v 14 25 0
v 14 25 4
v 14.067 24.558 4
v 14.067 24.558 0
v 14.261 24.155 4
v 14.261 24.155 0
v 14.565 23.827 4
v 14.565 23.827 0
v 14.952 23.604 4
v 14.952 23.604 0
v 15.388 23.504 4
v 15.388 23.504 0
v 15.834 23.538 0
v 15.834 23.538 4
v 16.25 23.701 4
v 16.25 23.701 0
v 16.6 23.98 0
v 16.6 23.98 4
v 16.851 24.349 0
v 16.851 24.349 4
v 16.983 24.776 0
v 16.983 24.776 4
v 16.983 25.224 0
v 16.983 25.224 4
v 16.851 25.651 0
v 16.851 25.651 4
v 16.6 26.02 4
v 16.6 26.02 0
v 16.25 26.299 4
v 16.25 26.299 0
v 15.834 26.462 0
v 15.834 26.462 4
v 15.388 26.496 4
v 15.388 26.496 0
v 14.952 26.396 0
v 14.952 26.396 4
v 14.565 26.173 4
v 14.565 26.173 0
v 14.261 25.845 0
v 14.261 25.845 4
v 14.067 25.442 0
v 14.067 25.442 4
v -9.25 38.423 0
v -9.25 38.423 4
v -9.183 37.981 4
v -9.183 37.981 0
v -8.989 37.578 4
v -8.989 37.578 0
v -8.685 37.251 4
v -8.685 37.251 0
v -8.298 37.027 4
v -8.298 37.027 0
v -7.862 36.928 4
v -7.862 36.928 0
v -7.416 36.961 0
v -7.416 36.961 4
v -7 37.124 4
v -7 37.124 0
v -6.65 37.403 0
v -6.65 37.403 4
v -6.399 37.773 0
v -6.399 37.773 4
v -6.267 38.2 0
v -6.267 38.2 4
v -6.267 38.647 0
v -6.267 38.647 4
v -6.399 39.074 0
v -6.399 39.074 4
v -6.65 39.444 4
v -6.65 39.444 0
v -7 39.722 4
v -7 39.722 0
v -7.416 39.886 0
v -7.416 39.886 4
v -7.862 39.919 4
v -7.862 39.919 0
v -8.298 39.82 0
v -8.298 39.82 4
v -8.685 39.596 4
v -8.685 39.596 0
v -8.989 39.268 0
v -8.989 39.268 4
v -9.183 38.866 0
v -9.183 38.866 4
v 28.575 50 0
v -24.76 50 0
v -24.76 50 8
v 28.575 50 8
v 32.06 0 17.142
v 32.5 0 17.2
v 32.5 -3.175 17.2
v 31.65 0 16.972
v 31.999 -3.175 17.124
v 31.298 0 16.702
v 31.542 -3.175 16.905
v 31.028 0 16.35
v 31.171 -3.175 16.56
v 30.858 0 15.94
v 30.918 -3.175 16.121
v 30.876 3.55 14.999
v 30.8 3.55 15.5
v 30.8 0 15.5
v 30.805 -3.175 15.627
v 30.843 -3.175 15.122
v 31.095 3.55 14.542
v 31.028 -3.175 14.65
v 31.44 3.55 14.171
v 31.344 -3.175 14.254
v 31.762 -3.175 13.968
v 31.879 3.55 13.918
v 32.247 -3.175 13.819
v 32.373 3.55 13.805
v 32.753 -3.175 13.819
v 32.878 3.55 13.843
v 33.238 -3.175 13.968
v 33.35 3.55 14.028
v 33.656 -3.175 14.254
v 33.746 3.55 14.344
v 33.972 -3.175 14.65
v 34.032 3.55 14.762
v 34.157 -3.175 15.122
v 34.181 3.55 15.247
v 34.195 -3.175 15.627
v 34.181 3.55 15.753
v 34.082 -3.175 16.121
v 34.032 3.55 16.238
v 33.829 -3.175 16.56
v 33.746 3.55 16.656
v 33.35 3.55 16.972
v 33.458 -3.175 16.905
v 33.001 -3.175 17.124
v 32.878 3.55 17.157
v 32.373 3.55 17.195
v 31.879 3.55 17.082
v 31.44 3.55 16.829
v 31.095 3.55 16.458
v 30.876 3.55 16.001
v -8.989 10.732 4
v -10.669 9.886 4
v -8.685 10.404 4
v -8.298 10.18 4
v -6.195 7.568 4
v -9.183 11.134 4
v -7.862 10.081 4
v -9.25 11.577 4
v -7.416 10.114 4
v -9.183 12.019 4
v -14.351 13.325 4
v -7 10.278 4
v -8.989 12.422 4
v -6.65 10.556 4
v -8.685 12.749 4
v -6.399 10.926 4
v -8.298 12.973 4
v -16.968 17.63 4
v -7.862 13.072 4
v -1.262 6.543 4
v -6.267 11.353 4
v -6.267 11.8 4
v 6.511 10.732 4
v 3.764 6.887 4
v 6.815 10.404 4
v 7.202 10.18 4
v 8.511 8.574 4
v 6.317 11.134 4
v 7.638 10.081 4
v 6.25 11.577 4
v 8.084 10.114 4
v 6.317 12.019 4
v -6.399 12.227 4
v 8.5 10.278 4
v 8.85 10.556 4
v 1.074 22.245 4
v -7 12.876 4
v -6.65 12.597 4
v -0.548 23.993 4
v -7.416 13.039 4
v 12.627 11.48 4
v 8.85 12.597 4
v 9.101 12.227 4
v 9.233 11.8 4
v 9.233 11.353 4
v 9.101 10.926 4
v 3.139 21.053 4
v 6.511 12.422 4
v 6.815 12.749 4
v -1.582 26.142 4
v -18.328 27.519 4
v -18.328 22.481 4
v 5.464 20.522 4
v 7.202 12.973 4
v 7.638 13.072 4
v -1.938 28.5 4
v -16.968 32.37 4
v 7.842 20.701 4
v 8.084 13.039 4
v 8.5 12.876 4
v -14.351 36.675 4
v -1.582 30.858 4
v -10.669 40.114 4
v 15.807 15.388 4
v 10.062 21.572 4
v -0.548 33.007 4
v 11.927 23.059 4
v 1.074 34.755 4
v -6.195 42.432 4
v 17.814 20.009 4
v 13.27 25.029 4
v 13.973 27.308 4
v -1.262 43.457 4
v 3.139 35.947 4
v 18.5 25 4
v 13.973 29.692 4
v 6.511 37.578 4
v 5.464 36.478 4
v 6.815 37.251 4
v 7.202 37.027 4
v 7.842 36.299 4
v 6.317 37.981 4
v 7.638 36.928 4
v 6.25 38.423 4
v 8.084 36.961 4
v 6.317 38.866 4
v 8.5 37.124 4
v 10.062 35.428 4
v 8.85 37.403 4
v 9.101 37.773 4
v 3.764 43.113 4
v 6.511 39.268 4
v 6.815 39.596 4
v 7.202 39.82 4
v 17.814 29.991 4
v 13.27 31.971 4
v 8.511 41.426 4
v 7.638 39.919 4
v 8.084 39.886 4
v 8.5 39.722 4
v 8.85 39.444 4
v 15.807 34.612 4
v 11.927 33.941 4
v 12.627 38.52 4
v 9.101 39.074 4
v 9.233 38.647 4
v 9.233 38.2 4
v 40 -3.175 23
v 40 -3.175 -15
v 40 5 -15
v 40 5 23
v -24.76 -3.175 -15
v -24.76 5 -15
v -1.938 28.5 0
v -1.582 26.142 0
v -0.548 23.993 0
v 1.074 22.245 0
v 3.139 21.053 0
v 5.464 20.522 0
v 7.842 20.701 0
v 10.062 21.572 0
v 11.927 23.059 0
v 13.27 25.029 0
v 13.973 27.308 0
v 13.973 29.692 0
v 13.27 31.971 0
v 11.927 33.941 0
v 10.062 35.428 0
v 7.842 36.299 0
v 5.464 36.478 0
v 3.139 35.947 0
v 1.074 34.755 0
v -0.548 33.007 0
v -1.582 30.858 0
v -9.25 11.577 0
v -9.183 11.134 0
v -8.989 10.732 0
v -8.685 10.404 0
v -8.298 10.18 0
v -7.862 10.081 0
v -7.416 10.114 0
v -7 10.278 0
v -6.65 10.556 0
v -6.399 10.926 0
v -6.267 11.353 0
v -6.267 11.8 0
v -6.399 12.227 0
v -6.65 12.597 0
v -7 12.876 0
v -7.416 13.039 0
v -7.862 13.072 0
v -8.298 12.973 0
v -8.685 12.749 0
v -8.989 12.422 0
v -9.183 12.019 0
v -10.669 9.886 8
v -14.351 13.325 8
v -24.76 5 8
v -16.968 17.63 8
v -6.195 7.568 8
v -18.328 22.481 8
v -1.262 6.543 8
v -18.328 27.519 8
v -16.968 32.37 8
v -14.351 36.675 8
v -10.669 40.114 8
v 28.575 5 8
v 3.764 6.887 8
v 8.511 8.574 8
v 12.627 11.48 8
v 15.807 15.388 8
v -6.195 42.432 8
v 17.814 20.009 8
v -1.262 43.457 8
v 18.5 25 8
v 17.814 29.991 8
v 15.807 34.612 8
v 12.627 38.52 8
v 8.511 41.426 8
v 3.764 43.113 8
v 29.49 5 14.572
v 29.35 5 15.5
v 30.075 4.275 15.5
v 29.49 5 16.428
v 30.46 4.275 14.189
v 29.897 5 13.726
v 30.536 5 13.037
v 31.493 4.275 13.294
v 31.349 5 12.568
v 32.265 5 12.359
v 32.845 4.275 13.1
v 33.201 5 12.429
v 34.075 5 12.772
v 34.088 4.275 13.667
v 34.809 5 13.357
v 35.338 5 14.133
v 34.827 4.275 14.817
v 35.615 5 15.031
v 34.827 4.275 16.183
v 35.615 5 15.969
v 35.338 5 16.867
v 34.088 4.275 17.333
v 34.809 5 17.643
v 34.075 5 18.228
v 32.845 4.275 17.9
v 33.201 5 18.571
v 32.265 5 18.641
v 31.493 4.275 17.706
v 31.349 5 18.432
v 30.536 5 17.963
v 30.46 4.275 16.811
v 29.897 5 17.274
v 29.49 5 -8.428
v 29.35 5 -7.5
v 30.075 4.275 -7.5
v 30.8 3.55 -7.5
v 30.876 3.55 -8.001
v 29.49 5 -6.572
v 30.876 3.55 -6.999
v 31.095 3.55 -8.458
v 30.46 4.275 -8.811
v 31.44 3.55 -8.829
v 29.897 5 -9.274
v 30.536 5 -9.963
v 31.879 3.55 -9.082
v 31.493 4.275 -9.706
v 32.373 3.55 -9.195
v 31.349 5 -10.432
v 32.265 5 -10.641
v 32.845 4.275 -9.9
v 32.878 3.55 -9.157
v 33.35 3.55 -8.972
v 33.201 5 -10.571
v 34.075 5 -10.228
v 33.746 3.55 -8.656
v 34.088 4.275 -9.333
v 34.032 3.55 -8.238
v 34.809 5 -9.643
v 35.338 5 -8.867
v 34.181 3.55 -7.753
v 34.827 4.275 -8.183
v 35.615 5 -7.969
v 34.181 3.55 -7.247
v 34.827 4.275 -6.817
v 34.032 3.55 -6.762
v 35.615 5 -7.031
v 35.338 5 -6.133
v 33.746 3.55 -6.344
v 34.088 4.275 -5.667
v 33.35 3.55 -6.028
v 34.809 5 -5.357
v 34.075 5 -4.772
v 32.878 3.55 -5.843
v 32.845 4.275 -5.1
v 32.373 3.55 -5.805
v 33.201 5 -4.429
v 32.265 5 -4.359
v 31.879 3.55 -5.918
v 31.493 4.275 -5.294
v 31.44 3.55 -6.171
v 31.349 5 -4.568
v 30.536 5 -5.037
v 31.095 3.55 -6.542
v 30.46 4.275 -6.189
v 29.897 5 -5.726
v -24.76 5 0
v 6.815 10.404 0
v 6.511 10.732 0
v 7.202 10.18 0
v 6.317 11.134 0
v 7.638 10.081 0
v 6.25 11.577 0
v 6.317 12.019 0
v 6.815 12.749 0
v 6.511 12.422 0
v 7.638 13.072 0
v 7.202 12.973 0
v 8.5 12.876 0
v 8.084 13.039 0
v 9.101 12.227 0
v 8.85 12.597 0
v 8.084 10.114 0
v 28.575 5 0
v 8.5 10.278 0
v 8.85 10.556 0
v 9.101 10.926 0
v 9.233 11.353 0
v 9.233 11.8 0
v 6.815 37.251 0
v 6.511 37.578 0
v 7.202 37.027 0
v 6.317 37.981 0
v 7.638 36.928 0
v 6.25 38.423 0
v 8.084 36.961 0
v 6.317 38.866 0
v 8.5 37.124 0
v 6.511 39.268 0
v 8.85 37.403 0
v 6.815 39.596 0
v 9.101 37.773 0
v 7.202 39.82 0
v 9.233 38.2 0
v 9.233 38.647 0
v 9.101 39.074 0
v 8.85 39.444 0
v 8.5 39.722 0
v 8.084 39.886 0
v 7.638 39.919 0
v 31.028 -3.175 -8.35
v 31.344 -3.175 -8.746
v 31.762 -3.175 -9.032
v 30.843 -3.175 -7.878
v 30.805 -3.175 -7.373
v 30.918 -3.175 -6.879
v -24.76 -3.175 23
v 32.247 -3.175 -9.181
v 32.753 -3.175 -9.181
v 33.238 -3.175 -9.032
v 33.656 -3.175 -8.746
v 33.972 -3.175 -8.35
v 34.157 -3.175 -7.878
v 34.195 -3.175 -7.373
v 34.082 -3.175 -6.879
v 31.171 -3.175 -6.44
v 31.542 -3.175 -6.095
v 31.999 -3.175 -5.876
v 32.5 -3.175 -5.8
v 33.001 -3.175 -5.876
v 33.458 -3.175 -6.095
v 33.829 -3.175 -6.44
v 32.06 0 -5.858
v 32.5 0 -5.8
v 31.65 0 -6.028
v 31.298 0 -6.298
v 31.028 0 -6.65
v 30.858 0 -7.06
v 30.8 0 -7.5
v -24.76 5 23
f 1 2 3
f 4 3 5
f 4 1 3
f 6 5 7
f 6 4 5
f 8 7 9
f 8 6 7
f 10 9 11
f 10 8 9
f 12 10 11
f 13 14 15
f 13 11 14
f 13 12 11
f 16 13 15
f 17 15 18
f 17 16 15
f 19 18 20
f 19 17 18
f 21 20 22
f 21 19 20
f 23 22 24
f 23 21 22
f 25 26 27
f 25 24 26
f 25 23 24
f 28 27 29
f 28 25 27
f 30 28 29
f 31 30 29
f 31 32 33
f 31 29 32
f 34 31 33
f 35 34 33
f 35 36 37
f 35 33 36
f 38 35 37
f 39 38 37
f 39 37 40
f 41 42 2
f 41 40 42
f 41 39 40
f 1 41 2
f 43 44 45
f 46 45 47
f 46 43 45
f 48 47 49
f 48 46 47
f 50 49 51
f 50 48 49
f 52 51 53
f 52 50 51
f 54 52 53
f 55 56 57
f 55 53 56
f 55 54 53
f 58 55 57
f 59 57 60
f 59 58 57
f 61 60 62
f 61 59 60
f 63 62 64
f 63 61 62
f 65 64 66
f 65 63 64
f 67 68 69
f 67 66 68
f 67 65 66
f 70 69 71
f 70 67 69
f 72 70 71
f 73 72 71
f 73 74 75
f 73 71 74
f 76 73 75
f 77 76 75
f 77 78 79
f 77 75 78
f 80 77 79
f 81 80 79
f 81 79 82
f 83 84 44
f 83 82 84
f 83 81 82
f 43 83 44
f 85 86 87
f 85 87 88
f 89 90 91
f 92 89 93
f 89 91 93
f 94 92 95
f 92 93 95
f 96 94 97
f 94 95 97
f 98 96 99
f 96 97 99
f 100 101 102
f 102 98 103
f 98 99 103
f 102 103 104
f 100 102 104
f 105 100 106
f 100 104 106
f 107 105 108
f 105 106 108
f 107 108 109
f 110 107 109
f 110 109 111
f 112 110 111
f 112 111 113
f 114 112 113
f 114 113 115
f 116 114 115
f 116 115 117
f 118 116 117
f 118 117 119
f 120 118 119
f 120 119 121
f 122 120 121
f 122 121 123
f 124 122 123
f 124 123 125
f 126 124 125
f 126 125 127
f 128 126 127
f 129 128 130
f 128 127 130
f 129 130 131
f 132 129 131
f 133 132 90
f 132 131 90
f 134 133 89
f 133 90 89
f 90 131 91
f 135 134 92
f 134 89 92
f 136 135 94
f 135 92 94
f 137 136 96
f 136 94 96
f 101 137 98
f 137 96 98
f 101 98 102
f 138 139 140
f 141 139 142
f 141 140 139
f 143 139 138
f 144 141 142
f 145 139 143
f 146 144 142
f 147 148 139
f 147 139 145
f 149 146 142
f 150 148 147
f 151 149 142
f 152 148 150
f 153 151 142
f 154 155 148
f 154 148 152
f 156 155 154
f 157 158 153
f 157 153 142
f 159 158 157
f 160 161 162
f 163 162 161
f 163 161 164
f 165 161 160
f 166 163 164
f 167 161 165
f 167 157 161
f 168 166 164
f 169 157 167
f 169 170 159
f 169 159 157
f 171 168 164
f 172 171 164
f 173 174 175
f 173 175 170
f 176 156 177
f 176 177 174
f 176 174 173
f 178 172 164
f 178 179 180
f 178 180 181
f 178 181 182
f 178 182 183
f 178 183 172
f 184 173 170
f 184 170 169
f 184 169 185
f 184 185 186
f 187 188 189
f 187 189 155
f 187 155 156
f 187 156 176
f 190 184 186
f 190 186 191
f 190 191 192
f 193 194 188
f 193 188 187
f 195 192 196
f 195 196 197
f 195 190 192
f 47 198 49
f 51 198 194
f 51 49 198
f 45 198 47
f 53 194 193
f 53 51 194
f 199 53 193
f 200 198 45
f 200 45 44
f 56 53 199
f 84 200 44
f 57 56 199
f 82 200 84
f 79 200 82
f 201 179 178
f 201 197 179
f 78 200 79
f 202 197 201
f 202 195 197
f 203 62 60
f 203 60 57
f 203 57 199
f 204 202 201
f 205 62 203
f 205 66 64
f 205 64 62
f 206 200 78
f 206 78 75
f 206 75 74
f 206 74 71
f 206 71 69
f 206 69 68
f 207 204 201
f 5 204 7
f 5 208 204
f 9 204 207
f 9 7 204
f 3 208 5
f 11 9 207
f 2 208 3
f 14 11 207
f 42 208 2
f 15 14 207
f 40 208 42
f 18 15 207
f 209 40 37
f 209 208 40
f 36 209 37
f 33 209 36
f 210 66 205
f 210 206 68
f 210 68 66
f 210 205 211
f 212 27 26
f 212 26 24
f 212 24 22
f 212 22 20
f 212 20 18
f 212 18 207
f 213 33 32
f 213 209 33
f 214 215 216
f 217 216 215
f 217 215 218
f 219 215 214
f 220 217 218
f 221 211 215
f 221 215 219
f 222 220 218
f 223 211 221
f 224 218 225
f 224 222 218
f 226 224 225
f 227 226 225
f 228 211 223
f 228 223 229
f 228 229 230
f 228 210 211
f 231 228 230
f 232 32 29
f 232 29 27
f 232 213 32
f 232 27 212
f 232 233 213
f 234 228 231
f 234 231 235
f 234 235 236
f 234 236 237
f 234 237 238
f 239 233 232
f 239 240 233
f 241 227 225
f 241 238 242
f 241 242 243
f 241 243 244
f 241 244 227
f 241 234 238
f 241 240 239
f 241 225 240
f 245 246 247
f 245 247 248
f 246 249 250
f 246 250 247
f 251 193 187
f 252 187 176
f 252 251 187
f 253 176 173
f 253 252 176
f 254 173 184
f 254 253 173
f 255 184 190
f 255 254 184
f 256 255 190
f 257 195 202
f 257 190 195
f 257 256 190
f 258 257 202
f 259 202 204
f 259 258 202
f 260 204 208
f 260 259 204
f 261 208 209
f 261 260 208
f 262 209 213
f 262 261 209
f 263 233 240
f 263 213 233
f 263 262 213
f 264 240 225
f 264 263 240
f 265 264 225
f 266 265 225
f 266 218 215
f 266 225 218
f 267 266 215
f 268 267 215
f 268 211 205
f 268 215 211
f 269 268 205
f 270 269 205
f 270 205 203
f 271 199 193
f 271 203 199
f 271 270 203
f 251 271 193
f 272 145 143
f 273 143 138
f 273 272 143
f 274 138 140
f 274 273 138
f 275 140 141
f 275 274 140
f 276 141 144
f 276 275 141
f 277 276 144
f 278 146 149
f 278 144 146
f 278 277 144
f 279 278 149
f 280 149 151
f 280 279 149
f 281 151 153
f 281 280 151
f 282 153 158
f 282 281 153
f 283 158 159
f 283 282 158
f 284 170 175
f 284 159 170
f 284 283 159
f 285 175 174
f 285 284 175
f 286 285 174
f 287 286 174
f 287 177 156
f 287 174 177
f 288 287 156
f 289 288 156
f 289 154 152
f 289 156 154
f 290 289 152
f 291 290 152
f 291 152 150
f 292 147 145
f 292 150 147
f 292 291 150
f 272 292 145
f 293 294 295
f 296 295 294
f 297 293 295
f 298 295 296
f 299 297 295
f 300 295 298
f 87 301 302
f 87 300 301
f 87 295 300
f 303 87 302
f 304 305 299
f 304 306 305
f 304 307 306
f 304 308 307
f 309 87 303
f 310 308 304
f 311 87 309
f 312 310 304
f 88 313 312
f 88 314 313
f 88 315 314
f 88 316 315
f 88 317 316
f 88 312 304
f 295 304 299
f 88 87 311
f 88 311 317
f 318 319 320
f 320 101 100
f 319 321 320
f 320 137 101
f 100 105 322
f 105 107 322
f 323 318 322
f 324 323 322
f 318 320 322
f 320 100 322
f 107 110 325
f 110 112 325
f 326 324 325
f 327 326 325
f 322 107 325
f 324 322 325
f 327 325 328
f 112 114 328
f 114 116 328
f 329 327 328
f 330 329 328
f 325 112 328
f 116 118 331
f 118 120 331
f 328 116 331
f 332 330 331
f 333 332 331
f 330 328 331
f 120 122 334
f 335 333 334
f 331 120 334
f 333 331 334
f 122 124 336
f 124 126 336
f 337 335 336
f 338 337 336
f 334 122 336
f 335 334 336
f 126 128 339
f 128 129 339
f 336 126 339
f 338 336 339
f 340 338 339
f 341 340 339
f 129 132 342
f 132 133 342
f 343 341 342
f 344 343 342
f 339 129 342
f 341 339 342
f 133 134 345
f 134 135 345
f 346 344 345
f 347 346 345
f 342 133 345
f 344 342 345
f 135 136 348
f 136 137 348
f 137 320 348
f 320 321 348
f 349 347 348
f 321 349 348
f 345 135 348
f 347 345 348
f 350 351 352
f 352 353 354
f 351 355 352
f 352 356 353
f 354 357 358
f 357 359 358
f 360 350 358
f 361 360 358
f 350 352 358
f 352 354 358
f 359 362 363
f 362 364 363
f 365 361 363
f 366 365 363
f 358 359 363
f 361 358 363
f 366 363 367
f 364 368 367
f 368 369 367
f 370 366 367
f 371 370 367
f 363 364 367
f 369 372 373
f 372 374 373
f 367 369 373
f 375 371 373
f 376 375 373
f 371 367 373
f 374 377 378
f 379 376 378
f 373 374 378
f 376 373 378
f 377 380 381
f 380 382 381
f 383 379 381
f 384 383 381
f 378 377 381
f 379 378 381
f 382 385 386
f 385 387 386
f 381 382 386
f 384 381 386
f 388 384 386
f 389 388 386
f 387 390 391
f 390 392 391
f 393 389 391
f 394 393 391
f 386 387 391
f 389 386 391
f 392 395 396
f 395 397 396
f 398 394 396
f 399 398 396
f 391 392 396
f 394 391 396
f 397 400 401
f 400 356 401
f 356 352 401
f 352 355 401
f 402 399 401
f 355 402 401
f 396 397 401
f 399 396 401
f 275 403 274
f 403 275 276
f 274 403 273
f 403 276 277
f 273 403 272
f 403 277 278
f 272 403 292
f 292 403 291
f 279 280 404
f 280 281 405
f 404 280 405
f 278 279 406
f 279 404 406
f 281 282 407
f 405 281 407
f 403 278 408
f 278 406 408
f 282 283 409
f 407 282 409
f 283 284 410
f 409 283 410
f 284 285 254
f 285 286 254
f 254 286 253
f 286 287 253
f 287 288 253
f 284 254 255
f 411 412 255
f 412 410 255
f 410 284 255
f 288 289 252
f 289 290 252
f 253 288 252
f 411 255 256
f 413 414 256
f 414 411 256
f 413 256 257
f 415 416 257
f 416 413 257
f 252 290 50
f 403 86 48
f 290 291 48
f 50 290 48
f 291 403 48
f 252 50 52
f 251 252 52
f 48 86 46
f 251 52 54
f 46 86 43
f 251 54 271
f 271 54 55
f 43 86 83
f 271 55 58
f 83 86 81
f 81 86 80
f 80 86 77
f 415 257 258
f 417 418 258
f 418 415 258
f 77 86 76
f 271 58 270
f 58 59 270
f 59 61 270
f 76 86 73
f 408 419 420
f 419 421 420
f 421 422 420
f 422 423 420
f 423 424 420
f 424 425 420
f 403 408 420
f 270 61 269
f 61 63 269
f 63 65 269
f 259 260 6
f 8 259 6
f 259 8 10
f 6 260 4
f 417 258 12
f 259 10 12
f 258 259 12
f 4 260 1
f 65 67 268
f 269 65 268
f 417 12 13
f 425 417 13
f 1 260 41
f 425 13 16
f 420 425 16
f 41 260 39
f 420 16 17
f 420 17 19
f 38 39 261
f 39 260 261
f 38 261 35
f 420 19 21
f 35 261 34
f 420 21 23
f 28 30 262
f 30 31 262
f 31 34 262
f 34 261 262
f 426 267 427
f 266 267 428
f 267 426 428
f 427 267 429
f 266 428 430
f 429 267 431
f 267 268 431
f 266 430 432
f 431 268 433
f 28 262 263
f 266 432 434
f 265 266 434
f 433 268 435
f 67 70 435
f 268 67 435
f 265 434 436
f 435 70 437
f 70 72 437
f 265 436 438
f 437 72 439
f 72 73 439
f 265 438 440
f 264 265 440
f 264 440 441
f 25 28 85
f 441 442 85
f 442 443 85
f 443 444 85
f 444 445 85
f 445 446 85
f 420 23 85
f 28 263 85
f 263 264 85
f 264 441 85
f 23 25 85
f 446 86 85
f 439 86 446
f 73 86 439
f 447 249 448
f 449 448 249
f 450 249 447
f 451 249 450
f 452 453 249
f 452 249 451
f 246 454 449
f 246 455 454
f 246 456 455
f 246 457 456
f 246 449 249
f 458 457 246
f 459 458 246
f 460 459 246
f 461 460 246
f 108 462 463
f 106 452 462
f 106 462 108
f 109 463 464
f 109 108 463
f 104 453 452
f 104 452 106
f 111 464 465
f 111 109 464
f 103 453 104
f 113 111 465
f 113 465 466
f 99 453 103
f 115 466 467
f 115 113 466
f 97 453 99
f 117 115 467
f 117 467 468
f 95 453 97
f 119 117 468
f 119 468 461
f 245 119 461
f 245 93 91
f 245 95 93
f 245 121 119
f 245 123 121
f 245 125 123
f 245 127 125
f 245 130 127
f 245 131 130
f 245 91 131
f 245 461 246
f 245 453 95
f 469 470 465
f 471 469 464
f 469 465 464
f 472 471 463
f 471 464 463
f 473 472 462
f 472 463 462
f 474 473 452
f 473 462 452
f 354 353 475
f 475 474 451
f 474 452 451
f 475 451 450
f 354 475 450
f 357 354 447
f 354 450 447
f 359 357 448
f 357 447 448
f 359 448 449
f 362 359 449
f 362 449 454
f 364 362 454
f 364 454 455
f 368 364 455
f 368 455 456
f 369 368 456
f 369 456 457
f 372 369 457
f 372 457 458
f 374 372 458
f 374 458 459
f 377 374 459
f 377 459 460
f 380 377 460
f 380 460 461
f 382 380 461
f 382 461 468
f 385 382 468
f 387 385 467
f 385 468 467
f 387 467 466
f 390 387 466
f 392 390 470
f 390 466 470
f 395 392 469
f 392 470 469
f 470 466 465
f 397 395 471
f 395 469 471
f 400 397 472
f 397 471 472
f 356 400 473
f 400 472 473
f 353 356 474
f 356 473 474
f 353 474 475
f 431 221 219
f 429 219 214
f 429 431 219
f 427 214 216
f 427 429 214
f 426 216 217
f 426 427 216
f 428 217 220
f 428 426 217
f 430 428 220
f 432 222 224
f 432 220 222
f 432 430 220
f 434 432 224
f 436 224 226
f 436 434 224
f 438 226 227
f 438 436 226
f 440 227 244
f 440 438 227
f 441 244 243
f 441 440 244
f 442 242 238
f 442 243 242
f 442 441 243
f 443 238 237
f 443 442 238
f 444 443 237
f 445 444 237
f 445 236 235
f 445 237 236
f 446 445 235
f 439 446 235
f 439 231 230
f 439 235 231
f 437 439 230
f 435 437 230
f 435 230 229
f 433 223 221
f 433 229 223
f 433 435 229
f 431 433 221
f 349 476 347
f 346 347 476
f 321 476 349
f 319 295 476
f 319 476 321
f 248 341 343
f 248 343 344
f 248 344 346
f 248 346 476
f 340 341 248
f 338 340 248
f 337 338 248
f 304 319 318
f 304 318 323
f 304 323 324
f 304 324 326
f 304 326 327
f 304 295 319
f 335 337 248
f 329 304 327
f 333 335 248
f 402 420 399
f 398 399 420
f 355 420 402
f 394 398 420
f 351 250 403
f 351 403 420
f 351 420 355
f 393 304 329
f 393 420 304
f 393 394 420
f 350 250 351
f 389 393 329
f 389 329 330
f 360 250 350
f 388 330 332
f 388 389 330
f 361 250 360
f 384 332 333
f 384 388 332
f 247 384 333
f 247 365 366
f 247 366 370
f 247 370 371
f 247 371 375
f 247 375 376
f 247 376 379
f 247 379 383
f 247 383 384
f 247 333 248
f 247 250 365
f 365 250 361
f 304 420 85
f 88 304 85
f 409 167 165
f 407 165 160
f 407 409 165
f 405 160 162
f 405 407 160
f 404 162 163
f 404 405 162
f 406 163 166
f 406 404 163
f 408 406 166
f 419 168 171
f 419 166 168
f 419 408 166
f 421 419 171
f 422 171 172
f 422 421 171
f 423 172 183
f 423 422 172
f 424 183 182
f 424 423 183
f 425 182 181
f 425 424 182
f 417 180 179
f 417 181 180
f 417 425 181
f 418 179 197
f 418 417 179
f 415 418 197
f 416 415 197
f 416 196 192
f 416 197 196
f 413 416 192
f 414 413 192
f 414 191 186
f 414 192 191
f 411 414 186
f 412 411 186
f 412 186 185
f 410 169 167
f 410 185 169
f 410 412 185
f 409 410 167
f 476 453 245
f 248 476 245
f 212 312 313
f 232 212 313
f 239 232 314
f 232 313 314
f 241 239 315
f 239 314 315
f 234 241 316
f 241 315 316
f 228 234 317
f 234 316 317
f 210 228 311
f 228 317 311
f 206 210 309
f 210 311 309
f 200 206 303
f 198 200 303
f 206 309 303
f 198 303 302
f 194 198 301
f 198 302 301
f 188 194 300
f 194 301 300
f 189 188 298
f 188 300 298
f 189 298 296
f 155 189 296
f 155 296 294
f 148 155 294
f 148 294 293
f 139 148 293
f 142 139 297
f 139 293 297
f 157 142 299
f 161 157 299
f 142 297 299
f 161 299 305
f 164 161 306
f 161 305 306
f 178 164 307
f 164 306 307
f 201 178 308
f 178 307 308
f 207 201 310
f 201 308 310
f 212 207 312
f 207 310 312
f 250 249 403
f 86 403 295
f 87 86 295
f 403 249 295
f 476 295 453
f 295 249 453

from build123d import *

# Parameters (mm, degrees)
SKETCH3_W                                       = 57.15
SKETCH3_H                                       = 50
BOSS_EXTRUDE1_DEPTH                             = 8
SKETCH3_3_R                                     = 1.5
SKETCH3_3_R_2                                   = 8
CUT_EXTRUDE2_DEPTH                              = 10
SKETCH4_R                                       = 18.5
CUT_EXTRUDE3_DEPTH                              = 4
BOSS_EXTRUDE2_DEPTH                             = 15
BOSS_EXTRUDE2_DEPTH_BACK                        = 23
SKETCH6_W                                       = 80
SKETCH6_H                                       = 5
CSK_FOR_M3_FLAT_HEAD_MACHINE_SCREW1_D           = 3.4
CSK_FOR_M3_FLAT_HEAD_MACHINE_SCREW1_CSINK_D     = 6.3
CSK_FOR_M3_FLAT_HEAD_MACHINE_SCREW1_CSINK_ANGLE = 90
CUT_EXTRUDE8_REACH                              = 66.452
SKETCH14_W                                      = 15.24
SKETCH14_H                                      = 38
CUT_EXTRUDE8_DIRECTION_2_DEPTH                  = 45
BOSS_EXTRUDE5_START                             = 3.175
SKETCH15_W                                      = 64.76
SKETCH15_H                                      = 38
SKETCH15_R                                      = 1.7
BOSS_EXTRUDE5_DEPTH                             = 3.175


with BuildPart() as part:
    # Sketch3 → Boss-Extrude1 (new body)
    with BuildSketch(Plane.XY):
        with Locations((0, 25)):
            Rectangle(SKETCH3_W, SKETCH3_H)
    extrude(amount=BOSS_EXTRUDE1_DEPTH)

    # Sketch3<3> → Cut-Extrude2 (cut)
    with BuildSketch(Plane.XY):
        with Locations(Location((-7.75, 38.423393759, 0), (0, 0, 180))):
            Circle(SKETCH3_3_R)
        with Locations(Location((7.75, 38.423393759, 0), (0, 0, 180))):
            Circle(SKETCH3_3_R)
        with Locations(Location((-7.75, 11.576606241, 0), (0, 0, 180))):
            Circle(SKETCH3_3_R)
        with Locations(Location((7.75, 11.576606241, 0), (0, 0, 180))):
            Circle(SKETCH3_3_R)
        with Locations(Location((15.5, 25, 0), (0, 0, 180))):
            Circle(SKETCH3_3_R)
        with Locations(Location((6.062177825, 28.499999999, 0), (0, 0, 180))):
            Circle(SKETCH3_3_R_2)
    extrude(amount=CUT_EXTRUDE2_DEPTH, mode=Mode.SUBTRACT)

    # Sketch4 → Cut-Extrude3 (cut)
    with BuildSketch(Plane.XY.offset(8)):
        with Locations((0, 25)):
            Circle(SKETCH4_R)
    extrude(amount=-CUT_EXTRUDE3_DEPTH, mode=Mode.SUBTRACT)

    # Sketch6 → Boss-Extrude2 (add, two sides: drawn at the far end of the back side and taken through both)
    with BuildSketch(Plane.XY.offset(8).offset(-BOSS_EXTRUDE2_DEPTH_BACK)):
        with Locations((0, 2.5)):
            Rectangle(SKETCH6_W, SKETCH6_H)
    extrude(amount=BOSS_EXTRUDE2_DEPTH + BOSS_EXTRUDE2_DEPTH_BACK)

    # CSK for M3 Flat Head Machine Screw1 (through all)
    with Locations(Plane(origin=(0, 5, 0), x_dir=(1, 0, 0), z_dir=(0, 1, 0))):
        with Locations((-32.5, 7.5), (-32.5, -15.5), (32.5, -15.5), (32.5, 7.5)):
            CounterSinkHole(CSK_FOR_M3_FLAT_HEAD_MACHINE_SCREW1_D / 2, CSK_FOR_M3_FLAT_HEAD_MACHINE_SCREW1_CSINK_D / 2, counter_sink_angle=CSK_FOR_M3_FLAT_HEAD_MACHINE_SCREW1_CSINK_ANGLE)

    # Sketch14 → Cut-Extrude8 (cut, up to next)
    with BuildSketch(Plane(origin=(0, 5, 0), x_dir=(1, 0, 0), z_dir=(0, 1, 0)), mode=Mode.PRIVATE) as cut_extrude8_sk1:
        with Locations((-32.38, -4)):
            Rectangle(SKETCH14_W, SKETCH14_H)
    cut_extrude8_tool1 = extrude(cut_extrude8_sk1.sketch, amount=-CUT_EXTRUDE8_REACH, mode=Mode.PRIVATE) & part.part
    add(cut_extrude8_tool1.solids().sort_by_distance((-32.38, 5, 4))[0], mode=Mode.SUBTRACT)

    # Sketch14 → Cut-Extrude8 direction 2 (cut)
    with BuildSketch(Plane(origin=(0, 5, 0), x_dir=(1, 0, 0), z_dir=(0, 1, 0))):
        with Locations((-32.38, -4)):
            Rectangle(SKETCH14_W, SKETCH14_H)
    extrude(amount=CUT_EXTRUDE8_DIRECTION_2_DEPTH, mode=Mode.SUBTRACT)

    # Sketch15 → Boss-Extrude5 (add)
    with BuildSketch(Plane.XZ.offset(BOSS_EXTRUDE5_START)):
        with Locations((7.62, 4)):
            Rectangle(SKETCH15_W, SKETCH15_H)
        with Locations(Location((32.5, 15.5, 0), (0, 0, 90))):
            Circle(SKETCH15_R, mode=Mode.SUBTRACT)
        with Locations(Location((32.5, -7.5, 0), (0, 0, 90))):
            Circle(SKETCH15_R, mode=Mode.SUBTRACT)
    extrude(amount=-BOSS_EXTRUDE5_DEPTH)


solid = part.part
